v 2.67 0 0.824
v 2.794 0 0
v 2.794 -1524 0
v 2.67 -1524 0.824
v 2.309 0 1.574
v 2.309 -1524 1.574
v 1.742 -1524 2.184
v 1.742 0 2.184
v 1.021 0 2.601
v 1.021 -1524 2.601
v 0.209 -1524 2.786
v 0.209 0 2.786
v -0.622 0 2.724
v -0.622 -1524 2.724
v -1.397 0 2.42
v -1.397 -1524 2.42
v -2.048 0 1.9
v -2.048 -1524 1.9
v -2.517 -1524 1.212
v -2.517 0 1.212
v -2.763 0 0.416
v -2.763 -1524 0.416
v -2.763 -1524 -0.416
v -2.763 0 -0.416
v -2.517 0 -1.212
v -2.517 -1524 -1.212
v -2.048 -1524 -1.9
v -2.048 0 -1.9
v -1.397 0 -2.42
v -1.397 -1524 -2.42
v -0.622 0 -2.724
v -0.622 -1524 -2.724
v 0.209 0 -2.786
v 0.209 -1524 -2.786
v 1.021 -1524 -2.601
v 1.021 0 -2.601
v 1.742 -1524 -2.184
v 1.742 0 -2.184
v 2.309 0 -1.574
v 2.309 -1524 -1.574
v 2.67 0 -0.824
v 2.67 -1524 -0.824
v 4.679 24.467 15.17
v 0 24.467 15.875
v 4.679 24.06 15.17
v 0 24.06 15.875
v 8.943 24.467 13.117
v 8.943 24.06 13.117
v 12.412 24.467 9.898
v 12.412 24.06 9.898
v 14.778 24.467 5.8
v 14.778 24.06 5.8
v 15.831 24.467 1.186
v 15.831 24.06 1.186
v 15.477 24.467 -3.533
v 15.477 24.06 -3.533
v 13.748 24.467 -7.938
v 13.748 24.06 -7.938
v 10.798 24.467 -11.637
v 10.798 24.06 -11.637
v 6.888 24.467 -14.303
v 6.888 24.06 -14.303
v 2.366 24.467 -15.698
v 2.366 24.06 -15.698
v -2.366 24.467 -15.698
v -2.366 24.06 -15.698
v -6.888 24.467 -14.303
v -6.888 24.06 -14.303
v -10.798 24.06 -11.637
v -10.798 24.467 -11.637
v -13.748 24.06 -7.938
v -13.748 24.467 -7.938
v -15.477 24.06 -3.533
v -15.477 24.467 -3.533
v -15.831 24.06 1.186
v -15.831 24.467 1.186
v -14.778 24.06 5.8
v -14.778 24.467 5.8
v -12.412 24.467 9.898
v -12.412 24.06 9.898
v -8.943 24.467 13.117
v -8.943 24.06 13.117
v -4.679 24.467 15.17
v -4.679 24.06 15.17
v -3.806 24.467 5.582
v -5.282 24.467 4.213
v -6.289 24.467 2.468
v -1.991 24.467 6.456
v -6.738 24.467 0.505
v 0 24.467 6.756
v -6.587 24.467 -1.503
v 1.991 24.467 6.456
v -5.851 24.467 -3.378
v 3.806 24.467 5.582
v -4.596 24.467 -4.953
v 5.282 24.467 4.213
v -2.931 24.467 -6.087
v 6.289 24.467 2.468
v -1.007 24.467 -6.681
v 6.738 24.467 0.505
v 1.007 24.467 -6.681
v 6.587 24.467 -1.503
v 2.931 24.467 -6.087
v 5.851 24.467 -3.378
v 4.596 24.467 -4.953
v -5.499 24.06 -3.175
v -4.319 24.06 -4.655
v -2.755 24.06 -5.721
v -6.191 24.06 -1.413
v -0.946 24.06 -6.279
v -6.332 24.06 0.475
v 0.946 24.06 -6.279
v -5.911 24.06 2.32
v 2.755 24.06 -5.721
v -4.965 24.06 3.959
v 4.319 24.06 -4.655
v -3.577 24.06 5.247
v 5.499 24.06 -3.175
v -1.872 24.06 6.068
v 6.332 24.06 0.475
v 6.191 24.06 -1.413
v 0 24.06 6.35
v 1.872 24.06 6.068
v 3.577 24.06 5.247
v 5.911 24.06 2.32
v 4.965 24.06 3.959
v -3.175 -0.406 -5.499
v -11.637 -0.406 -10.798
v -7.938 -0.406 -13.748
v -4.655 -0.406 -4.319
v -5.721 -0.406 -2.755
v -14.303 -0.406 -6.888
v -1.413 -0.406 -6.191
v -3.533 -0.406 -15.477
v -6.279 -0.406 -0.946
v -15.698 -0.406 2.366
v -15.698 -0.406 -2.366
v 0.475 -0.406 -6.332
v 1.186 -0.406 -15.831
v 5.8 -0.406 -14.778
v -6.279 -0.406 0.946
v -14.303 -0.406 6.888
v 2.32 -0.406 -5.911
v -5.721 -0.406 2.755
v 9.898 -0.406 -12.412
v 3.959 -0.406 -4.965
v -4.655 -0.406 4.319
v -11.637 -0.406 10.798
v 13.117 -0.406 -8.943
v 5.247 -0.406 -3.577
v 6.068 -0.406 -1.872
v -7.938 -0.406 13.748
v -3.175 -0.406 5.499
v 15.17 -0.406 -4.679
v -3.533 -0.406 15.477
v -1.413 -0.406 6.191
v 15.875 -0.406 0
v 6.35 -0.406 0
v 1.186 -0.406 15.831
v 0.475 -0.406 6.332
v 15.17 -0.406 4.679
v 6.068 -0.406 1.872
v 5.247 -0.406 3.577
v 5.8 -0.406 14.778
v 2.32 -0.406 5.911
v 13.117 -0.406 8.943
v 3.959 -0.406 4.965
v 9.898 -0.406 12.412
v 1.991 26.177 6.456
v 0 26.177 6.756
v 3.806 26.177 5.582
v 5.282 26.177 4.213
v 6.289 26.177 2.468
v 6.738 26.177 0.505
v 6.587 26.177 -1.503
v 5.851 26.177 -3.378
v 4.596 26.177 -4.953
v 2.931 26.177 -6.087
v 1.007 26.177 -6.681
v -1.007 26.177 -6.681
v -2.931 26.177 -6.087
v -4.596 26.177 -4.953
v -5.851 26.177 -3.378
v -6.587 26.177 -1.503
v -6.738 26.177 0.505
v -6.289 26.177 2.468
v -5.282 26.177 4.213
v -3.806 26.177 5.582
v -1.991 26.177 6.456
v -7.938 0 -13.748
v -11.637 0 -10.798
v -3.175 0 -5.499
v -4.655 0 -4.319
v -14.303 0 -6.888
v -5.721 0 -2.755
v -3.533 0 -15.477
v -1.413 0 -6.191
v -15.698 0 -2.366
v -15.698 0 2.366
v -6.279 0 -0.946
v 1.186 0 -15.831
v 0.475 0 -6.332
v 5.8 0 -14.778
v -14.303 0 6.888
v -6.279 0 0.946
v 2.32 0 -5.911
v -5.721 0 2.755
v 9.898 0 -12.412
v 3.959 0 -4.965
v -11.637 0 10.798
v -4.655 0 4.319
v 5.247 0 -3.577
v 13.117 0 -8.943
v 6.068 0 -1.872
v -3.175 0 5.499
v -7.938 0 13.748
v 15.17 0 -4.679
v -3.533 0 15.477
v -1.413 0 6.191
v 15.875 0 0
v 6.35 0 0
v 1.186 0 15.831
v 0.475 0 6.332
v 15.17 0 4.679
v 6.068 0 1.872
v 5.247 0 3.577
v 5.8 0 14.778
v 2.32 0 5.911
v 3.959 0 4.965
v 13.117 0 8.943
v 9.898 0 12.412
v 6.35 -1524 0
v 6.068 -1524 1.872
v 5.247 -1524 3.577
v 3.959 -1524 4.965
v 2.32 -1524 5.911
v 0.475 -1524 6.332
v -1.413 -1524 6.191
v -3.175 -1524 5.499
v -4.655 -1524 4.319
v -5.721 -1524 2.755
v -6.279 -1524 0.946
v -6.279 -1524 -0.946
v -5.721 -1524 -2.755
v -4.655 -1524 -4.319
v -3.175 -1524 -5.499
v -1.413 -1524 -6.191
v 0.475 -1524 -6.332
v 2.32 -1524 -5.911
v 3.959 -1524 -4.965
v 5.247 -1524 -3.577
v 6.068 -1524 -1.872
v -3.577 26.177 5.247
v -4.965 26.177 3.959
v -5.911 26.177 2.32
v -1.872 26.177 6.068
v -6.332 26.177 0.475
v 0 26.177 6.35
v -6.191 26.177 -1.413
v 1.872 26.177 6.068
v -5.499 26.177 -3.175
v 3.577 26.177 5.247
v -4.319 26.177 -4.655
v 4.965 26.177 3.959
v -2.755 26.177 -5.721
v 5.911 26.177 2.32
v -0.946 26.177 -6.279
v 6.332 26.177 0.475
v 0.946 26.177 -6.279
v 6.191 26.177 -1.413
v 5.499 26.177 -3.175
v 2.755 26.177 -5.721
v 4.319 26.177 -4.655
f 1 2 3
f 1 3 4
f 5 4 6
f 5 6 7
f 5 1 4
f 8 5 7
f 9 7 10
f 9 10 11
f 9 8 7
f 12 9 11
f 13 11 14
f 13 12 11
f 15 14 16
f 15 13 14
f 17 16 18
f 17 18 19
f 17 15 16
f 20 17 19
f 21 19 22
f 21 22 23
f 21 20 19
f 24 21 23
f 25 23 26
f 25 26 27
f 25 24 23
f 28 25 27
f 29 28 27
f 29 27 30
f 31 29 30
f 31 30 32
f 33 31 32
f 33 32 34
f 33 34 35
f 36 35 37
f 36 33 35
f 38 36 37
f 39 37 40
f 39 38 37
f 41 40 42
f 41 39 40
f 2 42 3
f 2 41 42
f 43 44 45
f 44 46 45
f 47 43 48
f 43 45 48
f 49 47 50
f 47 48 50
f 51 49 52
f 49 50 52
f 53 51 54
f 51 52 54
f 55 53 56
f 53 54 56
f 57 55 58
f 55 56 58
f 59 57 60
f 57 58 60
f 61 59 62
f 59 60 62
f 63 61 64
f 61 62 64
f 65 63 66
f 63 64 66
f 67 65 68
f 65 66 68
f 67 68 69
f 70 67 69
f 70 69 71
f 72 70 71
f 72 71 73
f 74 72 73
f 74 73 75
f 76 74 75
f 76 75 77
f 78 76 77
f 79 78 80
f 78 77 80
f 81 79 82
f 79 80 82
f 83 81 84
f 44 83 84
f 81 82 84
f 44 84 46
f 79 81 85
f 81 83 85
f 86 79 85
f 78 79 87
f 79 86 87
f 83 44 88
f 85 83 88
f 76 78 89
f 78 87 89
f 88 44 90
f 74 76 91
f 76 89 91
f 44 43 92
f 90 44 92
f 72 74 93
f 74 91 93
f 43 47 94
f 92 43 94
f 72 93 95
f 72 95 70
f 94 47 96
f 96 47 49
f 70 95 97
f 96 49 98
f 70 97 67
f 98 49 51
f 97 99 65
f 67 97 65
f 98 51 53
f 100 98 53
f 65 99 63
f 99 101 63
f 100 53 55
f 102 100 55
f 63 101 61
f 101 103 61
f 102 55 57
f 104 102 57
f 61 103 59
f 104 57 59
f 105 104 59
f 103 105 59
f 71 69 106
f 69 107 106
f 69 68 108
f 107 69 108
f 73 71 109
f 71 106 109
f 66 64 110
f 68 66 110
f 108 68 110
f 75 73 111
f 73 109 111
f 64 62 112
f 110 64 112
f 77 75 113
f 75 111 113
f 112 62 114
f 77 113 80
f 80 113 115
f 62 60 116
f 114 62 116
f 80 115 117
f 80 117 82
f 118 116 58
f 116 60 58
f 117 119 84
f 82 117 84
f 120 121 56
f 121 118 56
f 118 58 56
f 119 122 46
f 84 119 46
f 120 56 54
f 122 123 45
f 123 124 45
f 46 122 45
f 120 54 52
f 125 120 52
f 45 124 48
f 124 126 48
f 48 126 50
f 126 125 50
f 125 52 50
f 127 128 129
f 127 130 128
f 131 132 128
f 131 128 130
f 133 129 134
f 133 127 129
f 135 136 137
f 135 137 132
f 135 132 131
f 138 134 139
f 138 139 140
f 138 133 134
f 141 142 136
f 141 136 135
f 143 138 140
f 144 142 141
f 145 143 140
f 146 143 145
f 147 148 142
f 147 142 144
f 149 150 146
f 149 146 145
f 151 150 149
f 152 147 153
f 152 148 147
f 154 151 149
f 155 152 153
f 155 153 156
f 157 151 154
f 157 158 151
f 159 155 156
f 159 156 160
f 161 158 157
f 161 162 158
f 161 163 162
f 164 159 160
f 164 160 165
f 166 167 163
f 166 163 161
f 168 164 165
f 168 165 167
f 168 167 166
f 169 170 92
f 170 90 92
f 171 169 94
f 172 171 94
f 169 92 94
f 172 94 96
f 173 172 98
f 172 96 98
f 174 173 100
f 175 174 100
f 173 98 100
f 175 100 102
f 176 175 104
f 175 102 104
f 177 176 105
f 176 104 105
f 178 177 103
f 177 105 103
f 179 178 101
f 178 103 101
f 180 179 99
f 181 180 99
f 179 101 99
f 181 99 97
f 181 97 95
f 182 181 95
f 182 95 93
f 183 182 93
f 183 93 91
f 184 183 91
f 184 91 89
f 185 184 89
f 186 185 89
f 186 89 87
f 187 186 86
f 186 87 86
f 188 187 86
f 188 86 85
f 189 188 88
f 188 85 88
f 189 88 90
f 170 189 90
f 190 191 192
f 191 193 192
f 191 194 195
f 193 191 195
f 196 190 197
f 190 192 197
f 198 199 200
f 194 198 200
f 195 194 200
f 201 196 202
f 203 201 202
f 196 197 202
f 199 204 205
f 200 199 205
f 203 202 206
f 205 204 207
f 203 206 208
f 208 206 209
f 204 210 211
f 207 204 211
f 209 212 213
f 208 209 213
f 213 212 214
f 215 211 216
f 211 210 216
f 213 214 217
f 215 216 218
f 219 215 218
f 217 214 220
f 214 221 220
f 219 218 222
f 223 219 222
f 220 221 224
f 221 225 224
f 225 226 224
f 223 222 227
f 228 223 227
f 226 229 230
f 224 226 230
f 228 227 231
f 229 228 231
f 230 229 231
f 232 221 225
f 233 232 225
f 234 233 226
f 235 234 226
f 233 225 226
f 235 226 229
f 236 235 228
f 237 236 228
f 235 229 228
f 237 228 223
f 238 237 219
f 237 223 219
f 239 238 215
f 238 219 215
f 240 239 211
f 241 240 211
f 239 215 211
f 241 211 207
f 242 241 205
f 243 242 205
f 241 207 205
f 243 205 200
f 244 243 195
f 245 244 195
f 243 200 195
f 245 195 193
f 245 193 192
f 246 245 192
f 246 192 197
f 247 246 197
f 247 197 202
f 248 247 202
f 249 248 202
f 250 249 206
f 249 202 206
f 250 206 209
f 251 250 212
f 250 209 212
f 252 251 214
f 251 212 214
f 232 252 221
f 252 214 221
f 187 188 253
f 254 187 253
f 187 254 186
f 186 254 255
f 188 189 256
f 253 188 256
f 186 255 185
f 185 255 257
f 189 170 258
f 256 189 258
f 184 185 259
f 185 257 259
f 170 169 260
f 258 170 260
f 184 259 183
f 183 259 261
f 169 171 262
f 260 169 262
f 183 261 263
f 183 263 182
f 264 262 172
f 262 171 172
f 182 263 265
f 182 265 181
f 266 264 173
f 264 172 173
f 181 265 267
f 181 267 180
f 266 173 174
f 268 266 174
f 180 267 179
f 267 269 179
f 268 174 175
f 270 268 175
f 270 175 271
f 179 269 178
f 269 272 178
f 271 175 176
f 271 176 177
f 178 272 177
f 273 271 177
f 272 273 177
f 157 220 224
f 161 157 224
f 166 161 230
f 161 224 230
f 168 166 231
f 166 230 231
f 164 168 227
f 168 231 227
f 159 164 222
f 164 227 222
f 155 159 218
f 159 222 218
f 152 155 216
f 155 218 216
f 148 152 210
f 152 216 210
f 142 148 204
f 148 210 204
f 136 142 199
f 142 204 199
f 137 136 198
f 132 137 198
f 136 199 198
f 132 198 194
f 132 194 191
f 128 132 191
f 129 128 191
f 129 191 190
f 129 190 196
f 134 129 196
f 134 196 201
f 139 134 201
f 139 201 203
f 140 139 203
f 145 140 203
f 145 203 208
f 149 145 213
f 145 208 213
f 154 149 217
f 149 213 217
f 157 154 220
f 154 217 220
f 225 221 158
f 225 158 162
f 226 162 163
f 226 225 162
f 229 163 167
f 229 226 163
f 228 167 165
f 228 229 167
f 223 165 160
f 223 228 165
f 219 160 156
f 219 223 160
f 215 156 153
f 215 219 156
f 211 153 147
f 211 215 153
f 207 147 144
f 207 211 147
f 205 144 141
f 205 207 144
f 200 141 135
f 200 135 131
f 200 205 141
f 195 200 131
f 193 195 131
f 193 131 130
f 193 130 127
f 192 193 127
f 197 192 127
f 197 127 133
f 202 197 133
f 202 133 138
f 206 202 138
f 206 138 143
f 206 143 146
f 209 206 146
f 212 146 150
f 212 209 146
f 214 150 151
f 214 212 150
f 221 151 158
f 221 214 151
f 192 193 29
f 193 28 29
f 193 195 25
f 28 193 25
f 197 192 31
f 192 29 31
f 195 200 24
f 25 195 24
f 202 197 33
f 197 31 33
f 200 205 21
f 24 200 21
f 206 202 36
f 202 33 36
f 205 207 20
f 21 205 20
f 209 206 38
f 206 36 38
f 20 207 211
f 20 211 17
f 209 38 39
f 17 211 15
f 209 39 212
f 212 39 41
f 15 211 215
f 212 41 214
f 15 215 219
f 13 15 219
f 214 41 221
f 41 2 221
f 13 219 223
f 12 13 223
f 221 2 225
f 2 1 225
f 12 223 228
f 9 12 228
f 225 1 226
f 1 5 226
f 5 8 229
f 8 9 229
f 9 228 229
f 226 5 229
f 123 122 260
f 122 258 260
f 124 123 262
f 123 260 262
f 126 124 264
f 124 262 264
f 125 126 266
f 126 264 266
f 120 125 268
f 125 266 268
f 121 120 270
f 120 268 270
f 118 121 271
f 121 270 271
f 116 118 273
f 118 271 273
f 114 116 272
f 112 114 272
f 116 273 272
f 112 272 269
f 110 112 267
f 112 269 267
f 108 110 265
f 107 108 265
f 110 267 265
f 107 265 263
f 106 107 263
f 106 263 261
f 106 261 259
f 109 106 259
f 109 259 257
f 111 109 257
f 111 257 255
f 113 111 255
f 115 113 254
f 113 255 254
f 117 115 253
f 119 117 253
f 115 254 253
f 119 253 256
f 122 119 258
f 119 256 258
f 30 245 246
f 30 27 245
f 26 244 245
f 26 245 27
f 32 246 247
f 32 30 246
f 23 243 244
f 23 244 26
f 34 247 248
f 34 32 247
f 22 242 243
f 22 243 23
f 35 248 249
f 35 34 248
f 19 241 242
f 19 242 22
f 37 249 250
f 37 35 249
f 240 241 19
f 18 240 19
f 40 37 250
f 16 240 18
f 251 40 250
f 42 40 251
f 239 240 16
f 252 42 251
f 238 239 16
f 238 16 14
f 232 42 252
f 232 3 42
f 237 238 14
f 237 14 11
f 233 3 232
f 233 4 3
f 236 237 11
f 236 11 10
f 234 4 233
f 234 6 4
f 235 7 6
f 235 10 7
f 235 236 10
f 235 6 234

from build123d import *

# Parameters (mm, degrees)
F0_R     = 15.875
F0_R_2   = 6.35
F1_DEPTH = 0.4064
F2_R     = 6.35
F2_R_2   = 2.794
F3_DEPTH = 1524


with BuildPart() as f1:
    # F0 (on Front) → F1 (new body)
    with BuildSketch(Plane.XZ):
        Circle(F0_R)
        Circle(F0_R_2, mode=Mode.SUBTRACT)
    extrude(amount=F1_DEPTH)


with BuildPart() as f3:
    # F2 (on Front) → F3 (new body)
    with BuildSketch(Plane.XZ):
        Circle(F2_R)
        Circle(F2_R_2, mode=Mode.SUBTRACT)
    extrude(amount=F3_DEPTH)


with BuildPart() as f5:
    # F4 (on Right) → F5 (revolve)
    with BuildSketch(Plane.YZ):
        Polygon((24.060233, 6.35), (26.176899, 6.35), (26.176899, 6.7564), (24.466633, 6.7564), (24.466633, 15.875), (24.060233, 15.875), align=None)
    revolve(axis=Axis((0, 25.4, 0), (0, 1, 0)))


solid = Compound([f1.part, f3.part, f5.part])
